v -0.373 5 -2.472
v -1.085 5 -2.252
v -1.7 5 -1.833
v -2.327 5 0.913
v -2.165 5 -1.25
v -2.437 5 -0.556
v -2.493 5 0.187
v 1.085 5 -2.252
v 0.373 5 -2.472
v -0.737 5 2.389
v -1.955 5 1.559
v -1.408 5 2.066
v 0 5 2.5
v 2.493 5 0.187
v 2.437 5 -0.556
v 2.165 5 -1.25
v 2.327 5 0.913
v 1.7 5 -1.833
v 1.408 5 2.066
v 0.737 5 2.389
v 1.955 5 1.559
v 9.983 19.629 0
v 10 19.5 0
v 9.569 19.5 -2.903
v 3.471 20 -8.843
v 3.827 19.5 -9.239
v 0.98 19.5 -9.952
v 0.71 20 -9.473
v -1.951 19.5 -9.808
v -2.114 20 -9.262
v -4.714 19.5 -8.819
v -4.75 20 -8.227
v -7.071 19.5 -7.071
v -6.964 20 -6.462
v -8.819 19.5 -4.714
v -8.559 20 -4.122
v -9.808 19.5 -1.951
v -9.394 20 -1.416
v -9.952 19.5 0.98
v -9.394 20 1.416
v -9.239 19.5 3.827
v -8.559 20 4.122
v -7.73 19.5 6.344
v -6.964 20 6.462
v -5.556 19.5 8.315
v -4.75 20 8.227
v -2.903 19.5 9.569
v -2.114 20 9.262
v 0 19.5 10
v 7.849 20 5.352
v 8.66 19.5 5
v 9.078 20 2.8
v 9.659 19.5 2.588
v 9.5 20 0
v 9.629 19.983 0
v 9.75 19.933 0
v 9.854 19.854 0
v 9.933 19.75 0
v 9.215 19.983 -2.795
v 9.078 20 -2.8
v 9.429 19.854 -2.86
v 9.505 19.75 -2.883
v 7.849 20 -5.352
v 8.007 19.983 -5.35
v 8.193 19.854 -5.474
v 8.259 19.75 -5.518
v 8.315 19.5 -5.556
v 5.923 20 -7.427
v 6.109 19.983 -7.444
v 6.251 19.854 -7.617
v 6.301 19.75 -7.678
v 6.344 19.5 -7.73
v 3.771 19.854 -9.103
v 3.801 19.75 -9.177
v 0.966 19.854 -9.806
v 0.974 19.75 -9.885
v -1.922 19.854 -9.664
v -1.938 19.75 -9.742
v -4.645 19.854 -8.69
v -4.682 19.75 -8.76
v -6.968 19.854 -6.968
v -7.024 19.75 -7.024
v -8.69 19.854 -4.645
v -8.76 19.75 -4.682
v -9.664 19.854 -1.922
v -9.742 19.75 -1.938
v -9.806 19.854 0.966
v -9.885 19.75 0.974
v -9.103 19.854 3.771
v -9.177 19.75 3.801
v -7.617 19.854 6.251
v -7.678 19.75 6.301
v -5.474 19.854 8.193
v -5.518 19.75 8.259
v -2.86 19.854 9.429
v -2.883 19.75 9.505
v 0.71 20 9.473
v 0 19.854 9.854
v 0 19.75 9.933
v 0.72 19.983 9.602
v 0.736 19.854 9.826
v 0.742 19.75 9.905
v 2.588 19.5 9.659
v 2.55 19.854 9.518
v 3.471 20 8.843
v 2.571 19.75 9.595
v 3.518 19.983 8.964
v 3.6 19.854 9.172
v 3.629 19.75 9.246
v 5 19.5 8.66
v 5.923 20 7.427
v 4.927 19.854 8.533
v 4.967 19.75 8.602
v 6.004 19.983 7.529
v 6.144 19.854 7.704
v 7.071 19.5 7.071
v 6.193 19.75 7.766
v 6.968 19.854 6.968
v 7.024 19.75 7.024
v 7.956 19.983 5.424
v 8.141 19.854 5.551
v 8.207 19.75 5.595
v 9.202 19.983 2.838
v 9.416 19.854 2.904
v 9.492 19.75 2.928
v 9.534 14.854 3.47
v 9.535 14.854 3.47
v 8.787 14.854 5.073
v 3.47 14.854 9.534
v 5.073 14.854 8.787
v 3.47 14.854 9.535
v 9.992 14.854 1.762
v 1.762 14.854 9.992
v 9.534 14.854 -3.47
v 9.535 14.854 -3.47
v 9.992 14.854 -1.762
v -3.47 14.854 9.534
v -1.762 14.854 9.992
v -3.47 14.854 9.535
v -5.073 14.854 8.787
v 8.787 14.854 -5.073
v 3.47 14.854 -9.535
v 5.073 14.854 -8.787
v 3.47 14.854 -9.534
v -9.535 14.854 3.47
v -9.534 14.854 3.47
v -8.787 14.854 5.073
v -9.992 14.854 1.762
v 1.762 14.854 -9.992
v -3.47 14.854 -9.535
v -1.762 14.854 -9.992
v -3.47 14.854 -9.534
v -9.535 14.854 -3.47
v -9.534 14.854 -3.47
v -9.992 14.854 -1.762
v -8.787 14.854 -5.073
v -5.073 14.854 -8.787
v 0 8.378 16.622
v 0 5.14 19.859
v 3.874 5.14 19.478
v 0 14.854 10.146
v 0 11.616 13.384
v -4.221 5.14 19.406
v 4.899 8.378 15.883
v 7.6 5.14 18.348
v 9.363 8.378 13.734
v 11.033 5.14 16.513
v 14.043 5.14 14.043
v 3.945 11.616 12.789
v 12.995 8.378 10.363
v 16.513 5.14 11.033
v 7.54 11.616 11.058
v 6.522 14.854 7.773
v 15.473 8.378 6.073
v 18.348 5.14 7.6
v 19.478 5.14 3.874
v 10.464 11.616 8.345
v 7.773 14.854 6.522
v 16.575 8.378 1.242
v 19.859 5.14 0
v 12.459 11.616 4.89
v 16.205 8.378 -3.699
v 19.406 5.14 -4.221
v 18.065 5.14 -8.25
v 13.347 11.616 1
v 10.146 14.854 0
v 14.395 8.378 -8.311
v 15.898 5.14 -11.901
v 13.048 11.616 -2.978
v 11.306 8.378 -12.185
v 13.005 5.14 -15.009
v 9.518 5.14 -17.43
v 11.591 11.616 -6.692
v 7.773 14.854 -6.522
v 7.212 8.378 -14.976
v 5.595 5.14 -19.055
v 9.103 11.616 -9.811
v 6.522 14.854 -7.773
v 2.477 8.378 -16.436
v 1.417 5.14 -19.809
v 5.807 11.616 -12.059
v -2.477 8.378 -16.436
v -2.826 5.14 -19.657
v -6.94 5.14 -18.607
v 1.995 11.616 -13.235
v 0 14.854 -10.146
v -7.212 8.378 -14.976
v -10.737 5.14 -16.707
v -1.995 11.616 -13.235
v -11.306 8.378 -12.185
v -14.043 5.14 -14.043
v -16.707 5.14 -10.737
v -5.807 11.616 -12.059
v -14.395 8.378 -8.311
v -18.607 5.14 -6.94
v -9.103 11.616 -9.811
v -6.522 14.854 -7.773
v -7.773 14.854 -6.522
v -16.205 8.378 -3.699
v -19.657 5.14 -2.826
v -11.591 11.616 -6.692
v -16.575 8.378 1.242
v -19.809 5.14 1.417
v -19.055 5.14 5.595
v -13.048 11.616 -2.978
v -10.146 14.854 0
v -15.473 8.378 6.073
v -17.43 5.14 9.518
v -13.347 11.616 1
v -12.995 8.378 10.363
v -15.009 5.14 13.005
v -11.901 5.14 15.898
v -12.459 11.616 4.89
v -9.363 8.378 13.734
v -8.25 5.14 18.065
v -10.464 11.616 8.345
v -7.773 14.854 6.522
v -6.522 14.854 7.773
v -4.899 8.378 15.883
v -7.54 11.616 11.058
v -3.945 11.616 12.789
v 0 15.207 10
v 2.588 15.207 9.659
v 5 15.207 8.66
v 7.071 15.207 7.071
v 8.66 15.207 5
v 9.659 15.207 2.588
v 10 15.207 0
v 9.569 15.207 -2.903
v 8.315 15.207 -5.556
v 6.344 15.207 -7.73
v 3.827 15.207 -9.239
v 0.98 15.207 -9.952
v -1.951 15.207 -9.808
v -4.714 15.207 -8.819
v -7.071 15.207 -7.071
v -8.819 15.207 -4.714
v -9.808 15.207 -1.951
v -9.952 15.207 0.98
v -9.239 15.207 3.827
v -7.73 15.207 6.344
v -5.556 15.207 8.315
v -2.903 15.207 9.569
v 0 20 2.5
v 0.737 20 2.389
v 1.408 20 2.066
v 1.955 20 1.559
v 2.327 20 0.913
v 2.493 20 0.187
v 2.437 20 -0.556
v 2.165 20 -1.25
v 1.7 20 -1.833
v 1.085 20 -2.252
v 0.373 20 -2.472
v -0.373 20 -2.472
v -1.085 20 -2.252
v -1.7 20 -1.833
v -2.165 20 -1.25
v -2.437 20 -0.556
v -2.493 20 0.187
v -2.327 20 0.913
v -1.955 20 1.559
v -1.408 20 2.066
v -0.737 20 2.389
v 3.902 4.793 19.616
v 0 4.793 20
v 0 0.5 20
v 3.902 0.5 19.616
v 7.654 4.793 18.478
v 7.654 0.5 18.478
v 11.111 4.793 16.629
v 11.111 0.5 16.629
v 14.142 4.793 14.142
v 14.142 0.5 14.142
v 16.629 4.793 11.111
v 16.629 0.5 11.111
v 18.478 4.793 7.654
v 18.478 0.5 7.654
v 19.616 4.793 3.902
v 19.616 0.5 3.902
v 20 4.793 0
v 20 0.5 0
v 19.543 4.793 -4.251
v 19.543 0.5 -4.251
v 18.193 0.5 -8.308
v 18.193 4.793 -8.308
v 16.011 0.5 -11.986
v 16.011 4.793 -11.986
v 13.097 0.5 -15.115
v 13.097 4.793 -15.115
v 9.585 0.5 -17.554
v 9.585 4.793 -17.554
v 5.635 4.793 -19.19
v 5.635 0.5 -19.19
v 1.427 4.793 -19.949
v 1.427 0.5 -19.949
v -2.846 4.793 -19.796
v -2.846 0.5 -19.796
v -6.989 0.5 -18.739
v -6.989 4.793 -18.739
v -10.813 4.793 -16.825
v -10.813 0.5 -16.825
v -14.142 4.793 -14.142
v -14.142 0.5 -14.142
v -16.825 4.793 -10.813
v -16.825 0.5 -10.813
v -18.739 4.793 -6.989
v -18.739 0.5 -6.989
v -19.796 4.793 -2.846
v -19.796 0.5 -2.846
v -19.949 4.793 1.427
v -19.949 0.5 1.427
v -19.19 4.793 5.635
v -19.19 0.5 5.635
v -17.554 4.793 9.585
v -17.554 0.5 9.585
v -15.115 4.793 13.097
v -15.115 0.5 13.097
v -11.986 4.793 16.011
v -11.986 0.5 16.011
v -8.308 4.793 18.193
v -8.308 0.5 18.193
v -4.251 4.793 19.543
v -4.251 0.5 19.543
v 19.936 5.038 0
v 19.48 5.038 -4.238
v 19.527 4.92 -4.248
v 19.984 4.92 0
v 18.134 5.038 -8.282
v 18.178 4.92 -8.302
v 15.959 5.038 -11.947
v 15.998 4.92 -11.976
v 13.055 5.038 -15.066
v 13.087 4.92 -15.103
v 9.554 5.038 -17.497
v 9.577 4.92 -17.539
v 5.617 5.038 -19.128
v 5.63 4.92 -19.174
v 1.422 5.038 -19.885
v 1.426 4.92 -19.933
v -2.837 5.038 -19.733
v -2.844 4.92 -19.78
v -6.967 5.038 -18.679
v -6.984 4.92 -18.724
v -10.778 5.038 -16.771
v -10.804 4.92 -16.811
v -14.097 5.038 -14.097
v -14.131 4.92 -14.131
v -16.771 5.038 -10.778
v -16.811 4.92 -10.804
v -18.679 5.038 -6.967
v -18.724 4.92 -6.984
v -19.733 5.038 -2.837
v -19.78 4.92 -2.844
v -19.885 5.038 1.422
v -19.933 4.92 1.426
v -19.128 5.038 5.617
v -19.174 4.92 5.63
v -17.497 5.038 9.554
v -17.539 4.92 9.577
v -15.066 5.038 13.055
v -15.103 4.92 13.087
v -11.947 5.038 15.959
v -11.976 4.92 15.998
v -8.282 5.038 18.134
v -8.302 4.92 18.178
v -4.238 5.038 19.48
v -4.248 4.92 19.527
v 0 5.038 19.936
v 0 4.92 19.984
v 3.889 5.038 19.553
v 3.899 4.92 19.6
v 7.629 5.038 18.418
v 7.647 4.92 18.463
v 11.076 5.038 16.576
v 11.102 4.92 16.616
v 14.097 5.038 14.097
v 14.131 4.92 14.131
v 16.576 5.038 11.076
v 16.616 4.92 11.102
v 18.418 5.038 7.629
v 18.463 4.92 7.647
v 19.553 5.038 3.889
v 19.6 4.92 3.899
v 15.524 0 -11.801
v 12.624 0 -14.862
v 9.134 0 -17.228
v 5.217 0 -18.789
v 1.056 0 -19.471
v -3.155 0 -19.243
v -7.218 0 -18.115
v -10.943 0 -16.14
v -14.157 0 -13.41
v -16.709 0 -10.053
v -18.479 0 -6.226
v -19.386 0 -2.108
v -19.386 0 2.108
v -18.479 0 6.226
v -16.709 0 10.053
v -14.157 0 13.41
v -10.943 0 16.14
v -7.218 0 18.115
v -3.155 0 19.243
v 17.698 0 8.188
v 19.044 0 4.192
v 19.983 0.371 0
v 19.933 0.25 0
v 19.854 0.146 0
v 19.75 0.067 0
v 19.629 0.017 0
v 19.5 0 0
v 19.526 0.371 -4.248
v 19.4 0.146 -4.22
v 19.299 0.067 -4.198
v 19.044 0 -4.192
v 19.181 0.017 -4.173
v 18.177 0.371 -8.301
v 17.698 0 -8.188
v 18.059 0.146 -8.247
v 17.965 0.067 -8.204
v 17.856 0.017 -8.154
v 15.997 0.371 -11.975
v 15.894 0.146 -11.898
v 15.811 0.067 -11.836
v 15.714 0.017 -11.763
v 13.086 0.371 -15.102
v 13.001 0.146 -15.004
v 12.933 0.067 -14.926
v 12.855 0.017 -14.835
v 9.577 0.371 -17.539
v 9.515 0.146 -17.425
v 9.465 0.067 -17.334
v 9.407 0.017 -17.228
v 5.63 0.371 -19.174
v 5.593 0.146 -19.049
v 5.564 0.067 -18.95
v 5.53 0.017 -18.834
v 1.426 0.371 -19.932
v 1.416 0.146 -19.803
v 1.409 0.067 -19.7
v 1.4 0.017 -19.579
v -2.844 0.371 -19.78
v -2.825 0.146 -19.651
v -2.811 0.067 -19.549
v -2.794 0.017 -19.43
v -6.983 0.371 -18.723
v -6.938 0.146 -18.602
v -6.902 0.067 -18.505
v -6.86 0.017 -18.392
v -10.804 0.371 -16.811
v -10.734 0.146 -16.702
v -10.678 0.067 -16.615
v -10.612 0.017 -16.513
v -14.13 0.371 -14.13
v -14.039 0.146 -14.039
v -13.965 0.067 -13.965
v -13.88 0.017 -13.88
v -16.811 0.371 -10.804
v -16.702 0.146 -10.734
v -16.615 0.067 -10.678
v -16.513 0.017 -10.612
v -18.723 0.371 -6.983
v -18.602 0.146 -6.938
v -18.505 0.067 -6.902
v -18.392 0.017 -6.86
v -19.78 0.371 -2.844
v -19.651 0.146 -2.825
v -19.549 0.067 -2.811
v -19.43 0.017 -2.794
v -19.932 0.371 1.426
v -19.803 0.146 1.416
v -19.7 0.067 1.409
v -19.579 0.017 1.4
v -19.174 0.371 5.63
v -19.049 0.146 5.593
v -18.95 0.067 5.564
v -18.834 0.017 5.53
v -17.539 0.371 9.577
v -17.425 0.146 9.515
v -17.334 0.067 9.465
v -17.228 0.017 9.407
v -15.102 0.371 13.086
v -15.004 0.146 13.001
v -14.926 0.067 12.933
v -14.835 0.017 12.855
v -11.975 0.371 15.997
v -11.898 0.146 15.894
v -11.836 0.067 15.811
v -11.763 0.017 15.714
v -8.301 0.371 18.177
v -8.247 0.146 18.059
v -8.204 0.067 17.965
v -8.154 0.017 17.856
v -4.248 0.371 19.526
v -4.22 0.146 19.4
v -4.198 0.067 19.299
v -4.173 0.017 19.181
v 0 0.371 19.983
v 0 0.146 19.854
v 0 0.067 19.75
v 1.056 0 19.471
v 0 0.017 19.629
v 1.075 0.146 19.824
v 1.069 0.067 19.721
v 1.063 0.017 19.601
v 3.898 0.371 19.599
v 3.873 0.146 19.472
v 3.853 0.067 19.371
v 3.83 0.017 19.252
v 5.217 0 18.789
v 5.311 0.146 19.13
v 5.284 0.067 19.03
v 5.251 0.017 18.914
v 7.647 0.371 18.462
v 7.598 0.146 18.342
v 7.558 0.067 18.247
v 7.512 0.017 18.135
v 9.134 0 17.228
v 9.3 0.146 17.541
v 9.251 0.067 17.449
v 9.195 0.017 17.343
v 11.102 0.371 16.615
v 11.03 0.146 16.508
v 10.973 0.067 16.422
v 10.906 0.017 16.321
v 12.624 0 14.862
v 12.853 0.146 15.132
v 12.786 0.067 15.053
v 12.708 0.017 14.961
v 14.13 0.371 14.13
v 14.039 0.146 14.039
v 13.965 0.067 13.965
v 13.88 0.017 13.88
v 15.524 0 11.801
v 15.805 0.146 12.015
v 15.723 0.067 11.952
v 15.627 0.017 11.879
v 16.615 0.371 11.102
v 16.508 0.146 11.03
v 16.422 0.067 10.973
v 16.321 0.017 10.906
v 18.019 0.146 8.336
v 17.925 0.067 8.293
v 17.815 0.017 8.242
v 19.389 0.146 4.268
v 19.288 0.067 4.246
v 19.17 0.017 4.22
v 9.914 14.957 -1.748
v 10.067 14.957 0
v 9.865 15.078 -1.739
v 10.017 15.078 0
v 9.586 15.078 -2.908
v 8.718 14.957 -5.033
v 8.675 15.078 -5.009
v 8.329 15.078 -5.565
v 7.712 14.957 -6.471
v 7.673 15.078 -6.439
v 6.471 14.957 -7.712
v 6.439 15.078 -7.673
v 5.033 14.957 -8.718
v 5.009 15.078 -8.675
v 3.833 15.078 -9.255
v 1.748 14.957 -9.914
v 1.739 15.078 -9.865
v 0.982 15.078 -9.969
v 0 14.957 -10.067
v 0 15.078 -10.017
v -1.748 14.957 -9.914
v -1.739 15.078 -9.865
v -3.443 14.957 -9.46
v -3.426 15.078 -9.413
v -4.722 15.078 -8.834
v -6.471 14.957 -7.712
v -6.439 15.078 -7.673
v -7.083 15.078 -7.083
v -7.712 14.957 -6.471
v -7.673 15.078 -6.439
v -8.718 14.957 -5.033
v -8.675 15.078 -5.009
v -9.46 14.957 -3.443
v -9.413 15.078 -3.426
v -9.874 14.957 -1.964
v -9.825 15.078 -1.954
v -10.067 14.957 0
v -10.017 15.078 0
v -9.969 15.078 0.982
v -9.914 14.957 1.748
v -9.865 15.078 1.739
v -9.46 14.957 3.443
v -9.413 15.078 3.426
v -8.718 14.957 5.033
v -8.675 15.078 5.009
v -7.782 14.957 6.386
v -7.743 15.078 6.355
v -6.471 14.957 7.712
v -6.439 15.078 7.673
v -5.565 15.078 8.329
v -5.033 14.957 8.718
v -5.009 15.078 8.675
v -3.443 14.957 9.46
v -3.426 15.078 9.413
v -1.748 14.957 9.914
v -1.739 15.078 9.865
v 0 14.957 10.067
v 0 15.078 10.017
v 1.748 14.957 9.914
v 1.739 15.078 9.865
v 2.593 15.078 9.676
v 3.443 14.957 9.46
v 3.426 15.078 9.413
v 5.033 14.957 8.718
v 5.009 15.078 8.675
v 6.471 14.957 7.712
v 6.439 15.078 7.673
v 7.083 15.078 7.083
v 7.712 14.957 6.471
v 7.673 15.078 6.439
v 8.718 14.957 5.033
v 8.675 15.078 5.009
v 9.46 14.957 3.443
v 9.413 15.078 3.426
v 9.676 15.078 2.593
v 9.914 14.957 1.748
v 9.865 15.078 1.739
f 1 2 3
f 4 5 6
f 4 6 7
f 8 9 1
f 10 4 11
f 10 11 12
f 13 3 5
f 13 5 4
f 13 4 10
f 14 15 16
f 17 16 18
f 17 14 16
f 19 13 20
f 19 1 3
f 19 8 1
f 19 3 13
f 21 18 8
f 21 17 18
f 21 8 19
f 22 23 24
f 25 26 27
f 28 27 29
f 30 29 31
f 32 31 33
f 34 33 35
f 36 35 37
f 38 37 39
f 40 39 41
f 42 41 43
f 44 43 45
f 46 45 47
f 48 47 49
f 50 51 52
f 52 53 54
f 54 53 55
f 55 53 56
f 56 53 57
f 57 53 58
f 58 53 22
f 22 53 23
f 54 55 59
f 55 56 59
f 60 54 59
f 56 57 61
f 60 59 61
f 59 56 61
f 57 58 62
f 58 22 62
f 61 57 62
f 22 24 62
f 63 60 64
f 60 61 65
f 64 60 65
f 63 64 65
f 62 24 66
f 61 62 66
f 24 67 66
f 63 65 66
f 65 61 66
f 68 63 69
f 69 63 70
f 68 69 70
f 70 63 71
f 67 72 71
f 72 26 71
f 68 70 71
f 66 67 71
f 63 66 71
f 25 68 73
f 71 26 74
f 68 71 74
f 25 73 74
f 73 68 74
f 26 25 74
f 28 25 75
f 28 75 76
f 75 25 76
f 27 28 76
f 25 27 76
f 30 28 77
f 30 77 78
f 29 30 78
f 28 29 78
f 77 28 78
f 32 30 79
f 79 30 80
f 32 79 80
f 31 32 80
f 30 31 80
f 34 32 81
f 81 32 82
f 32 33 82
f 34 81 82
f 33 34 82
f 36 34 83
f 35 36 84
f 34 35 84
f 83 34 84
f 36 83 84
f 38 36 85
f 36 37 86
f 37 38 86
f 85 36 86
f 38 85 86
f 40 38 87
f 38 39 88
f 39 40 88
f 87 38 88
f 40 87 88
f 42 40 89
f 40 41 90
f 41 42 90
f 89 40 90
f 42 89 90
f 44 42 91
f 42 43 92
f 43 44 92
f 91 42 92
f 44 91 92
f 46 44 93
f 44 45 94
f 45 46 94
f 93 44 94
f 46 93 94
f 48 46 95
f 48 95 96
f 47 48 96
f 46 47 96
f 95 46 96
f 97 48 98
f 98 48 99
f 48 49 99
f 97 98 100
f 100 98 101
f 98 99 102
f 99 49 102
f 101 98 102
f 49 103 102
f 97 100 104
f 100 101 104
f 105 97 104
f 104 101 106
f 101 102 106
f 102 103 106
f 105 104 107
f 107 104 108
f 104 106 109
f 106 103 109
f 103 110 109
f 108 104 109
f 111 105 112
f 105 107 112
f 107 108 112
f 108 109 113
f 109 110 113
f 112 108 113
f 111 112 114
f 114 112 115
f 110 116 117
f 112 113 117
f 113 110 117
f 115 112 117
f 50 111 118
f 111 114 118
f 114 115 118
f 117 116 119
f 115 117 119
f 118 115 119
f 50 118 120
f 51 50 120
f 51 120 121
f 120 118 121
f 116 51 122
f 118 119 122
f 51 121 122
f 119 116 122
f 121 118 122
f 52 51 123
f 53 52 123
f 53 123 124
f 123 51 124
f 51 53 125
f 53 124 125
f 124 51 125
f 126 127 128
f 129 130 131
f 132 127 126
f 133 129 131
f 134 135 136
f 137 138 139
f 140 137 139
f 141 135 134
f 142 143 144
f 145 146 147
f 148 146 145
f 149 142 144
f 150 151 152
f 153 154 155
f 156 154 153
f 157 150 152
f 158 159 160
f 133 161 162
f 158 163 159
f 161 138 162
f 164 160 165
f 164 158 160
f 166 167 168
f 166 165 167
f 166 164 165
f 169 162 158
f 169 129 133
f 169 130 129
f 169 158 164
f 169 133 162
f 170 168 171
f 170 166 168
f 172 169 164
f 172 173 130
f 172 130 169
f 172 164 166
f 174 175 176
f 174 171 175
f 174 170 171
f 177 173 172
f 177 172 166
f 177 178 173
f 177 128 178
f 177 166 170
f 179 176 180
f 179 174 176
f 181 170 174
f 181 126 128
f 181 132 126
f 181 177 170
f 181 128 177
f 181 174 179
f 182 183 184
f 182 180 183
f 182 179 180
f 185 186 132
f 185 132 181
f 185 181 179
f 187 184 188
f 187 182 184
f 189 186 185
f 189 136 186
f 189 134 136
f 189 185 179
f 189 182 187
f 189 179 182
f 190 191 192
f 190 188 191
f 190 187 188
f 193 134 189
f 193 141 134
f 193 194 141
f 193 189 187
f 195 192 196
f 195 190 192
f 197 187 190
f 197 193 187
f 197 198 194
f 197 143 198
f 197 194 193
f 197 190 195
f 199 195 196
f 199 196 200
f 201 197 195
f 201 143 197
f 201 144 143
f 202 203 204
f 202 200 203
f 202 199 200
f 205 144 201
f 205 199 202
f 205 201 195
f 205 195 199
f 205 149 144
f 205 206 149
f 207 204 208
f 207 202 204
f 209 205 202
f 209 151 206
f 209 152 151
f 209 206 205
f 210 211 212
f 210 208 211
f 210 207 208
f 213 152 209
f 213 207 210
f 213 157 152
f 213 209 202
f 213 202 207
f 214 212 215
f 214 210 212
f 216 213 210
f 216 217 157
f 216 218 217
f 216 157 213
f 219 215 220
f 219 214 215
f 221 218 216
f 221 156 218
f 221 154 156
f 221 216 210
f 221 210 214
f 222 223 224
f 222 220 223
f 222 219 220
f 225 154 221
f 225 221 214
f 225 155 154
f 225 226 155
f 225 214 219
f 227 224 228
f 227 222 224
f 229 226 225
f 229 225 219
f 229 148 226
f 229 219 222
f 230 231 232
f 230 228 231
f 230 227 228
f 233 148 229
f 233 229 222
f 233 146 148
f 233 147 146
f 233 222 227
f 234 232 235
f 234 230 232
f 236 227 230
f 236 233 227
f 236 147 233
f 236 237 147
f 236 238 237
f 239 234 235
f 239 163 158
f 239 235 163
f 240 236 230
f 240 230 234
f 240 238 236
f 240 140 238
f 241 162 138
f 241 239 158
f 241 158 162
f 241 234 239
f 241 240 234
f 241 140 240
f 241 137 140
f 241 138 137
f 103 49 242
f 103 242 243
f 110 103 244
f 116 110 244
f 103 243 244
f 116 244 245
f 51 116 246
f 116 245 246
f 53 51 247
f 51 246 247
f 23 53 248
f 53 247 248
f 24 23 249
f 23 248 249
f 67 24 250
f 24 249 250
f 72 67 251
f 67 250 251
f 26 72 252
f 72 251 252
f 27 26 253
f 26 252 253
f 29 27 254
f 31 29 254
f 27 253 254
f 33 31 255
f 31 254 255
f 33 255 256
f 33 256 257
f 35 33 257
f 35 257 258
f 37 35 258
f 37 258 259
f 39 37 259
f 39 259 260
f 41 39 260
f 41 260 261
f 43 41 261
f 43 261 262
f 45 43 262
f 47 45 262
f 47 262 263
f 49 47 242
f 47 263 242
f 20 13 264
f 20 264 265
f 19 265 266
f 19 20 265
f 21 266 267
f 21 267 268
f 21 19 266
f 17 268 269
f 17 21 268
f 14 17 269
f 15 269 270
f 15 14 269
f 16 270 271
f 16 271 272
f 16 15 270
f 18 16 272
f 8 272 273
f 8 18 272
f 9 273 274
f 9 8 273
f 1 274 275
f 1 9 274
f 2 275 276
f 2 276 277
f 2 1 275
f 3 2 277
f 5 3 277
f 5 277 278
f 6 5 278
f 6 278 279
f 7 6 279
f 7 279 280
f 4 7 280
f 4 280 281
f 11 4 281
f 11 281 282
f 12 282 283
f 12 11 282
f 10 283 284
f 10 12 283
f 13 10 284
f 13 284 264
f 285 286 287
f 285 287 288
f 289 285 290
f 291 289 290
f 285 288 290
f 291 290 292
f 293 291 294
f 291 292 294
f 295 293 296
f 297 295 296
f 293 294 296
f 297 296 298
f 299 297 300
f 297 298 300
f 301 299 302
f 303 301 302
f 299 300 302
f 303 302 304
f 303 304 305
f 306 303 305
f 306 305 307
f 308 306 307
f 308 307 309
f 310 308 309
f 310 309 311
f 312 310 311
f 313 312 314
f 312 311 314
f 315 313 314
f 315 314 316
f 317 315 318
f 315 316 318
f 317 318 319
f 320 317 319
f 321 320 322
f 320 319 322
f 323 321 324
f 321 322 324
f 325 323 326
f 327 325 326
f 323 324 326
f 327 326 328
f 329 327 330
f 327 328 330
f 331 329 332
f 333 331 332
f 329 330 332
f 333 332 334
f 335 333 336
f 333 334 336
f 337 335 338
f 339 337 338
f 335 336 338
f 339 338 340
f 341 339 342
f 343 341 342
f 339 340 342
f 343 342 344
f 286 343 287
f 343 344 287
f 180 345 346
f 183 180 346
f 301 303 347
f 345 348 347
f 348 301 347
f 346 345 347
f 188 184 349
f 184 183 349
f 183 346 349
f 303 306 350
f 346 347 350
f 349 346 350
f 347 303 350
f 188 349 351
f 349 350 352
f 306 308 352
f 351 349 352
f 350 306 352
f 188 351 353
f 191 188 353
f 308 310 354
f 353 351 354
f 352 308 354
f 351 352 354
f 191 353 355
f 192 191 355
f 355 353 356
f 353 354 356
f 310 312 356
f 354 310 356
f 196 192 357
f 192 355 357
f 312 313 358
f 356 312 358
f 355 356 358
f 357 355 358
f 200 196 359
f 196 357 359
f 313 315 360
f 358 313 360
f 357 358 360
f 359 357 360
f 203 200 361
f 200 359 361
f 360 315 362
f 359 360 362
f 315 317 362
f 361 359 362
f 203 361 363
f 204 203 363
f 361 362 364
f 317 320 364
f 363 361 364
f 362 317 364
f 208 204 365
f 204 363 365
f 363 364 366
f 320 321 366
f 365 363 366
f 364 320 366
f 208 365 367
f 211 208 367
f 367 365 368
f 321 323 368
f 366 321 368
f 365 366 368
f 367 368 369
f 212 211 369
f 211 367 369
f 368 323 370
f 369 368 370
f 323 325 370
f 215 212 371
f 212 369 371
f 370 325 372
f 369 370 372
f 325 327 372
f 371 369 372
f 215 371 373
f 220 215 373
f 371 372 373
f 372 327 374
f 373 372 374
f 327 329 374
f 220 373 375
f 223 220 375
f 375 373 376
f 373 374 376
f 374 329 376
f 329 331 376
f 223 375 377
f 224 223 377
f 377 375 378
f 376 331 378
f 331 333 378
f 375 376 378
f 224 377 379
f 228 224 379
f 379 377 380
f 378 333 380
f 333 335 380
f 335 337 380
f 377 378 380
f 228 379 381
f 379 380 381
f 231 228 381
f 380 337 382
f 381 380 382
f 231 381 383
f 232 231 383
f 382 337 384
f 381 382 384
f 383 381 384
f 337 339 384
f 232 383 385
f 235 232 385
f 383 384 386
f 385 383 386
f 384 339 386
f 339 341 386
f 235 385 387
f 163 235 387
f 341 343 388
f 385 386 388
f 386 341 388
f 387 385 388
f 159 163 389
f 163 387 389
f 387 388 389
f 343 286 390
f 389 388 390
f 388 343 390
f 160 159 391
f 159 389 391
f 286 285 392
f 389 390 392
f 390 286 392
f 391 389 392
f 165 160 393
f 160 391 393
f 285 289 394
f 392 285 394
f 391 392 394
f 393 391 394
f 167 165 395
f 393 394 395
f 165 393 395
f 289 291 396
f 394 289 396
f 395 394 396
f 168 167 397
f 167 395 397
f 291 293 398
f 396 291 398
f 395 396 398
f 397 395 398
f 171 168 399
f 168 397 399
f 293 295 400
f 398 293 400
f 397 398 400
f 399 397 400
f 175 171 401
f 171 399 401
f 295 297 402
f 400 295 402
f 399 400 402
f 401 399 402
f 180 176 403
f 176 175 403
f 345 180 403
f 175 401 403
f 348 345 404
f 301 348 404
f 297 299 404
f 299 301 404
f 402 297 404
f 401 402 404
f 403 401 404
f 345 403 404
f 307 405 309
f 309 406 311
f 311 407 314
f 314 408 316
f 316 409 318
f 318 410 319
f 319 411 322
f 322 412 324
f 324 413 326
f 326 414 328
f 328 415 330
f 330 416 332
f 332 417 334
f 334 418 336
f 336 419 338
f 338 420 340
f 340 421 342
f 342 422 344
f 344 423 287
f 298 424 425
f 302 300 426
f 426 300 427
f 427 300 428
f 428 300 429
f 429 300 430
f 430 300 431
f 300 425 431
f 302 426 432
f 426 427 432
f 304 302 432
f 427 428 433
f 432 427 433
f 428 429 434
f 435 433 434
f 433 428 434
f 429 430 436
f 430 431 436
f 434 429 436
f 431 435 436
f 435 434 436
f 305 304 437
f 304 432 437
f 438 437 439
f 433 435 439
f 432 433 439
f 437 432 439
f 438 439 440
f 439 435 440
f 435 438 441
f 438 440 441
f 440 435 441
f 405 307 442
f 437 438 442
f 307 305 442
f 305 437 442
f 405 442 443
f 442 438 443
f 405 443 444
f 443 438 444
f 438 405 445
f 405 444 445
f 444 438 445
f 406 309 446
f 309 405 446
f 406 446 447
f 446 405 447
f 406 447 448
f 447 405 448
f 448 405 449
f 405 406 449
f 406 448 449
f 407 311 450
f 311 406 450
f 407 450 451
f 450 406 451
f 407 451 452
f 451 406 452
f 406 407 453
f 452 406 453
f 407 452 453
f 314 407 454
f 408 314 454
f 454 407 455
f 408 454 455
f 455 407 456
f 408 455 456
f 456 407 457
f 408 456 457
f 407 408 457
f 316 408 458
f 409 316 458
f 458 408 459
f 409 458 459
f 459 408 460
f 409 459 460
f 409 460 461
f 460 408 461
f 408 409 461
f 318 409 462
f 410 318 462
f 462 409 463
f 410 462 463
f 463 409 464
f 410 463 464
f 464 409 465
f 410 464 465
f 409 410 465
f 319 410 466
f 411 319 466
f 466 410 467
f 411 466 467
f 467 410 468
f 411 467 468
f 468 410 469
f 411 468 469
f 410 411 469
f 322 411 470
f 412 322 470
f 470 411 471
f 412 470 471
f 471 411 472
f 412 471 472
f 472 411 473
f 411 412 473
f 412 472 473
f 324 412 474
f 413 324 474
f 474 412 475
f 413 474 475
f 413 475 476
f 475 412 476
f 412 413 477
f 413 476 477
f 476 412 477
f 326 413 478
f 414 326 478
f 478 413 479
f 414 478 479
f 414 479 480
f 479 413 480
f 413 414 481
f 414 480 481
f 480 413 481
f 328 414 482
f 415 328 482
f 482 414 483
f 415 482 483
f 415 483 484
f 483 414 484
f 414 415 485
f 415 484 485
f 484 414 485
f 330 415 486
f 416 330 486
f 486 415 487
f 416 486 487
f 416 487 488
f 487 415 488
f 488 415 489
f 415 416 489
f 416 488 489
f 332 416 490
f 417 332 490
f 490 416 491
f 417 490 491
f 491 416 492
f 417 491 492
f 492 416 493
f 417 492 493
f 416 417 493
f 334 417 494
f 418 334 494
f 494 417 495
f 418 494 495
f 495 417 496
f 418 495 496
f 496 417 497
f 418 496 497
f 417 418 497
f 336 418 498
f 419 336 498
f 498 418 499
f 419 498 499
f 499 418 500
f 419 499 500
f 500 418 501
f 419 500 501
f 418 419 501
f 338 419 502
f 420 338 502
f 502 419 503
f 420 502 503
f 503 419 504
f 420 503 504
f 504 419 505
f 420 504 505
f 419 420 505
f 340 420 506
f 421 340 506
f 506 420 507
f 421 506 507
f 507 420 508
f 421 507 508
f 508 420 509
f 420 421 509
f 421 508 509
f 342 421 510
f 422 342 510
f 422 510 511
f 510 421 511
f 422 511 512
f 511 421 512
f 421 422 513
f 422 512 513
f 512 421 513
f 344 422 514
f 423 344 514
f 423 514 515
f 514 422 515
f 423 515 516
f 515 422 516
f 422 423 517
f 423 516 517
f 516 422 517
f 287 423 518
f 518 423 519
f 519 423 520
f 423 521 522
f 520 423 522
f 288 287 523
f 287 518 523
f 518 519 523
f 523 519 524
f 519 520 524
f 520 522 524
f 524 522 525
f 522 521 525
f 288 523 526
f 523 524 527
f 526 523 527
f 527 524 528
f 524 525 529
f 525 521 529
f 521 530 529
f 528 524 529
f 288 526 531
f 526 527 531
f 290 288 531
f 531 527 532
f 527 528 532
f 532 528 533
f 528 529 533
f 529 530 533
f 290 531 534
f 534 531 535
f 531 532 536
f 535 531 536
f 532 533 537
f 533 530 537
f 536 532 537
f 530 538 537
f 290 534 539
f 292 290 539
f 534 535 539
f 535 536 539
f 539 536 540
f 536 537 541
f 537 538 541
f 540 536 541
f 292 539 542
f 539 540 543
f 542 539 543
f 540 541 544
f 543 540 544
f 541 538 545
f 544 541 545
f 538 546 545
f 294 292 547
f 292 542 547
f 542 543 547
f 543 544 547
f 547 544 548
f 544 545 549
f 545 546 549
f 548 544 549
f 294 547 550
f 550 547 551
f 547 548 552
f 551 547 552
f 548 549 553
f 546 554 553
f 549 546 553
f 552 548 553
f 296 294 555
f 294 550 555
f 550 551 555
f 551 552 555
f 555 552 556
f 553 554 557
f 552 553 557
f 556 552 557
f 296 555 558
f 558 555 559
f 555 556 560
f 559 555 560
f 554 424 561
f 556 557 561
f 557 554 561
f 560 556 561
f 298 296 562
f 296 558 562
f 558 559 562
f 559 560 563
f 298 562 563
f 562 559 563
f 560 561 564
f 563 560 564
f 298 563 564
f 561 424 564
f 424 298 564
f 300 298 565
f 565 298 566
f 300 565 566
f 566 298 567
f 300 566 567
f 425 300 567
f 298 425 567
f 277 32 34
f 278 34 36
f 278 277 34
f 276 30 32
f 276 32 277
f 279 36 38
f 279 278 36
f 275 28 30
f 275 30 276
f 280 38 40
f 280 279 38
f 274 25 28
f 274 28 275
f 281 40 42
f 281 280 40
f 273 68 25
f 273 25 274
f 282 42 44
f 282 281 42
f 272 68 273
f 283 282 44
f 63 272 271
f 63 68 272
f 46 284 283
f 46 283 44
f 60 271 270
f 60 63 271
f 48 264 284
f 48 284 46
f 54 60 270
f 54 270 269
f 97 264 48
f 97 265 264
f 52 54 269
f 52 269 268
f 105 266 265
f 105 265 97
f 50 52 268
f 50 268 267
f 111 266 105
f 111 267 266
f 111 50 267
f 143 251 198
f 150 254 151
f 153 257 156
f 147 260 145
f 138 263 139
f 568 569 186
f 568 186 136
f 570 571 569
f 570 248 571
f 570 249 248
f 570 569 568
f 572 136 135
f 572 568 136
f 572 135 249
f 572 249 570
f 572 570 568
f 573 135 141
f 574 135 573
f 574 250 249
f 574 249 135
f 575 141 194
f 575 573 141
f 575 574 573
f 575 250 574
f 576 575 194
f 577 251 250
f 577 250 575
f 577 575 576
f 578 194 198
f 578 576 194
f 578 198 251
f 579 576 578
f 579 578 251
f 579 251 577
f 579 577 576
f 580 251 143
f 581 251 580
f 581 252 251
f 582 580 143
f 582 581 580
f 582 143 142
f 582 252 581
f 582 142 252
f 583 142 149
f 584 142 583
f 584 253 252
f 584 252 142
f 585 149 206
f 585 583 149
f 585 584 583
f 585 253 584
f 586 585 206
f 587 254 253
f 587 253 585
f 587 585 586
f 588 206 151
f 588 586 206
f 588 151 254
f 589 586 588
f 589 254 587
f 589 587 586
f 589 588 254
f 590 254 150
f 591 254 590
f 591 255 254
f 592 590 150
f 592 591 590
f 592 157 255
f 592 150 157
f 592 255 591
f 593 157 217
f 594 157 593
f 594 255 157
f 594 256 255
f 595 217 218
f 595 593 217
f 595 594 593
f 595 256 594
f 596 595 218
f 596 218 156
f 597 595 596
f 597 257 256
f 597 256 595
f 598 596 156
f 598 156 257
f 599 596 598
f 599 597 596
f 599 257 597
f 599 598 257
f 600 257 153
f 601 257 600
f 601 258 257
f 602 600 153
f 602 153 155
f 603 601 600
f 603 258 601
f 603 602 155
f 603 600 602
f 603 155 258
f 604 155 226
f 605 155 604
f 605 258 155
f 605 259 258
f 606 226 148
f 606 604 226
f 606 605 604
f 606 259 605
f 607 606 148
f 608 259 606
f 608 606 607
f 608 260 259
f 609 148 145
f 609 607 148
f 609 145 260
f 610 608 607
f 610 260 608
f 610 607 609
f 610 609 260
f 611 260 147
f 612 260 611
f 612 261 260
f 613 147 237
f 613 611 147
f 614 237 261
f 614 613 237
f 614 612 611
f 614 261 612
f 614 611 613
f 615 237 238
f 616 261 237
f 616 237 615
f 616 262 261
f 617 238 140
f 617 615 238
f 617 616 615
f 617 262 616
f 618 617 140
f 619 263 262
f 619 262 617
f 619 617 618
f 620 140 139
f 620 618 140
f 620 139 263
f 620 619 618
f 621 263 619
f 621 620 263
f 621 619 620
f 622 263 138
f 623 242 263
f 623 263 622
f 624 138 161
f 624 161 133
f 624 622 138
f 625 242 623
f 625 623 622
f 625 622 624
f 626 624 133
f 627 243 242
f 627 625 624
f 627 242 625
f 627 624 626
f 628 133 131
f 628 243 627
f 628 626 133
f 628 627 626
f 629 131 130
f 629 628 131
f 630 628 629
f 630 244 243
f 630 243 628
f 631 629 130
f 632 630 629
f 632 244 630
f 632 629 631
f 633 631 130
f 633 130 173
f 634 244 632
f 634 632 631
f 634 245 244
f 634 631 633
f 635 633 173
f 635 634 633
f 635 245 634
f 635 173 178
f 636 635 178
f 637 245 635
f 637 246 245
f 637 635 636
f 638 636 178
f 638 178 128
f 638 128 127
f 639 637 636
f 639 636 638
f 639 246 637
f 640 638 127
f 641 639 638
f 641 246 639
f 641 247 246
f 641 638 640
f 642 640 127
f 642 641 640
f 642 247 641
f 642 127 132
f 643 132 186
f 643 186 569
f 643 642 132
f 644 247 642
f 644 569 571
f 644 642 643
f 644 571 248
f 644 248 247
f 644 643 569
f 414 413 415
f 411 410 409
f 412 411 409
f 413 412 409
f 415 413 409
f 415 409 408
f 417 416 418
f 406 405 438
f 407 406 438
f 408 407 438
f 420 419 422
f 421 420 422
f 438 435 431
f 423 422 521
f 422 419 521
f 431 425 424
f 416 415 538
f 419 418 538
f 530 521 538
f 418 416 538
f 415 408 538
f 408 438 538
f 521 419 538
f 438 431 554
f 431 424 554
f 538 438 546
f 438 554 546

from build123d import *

# Parameters (mm, degrees)
SKETCH1_R           = 20
BOSS_EXTRUDE1_DEPTH = 20
CUT_EXTRUDE1_START  = -15
SKETCH2_R           = 20
SKETCH2_R_2         = 10
SKETCH2_R_3         = 2.5
CUT_EXTRUDE1_DEPTH  = 15
CHAMFER1_SIZE       = 10


with BuildPart() as part:
    # Sketch1 → Boss-Extrude1 (new body)
    with BuildSketch(Plane(origin=(0, 0, 0), x_dir=(1, 0, 0), z_dir=(0, 1, 0))):
        with Locations(Location((0, 0, 0), (0, 0, 270))):
            Circle(SKETCH1_R)
    extrude(amount=BOSS_EXTRUDE1_DEPTH)

    # Sketch2 → Cut-Extrude1 (cut)
    # profile 1 of 2: a face of its own
    with BuildSketch(Plane(origin=(0, 20, 0), x_dir=(1, 0, 0), z_dir=(0, 1, 0)).offset(CUT_EXTRUDE1_START)):
        with Locations(Location((0, 0, 0), (0, 0, 270))):
            Circle(SKETCH2_R)
        with Locations(Location((0, 0, 0), (0, 0, 270))):
            Circle(SKETCH2_R_2, mode=Mode.SUBTRACT)
    # profile 2 of 2: a face of its own
    with BuildSketch(Plane(origin=(0, 20, 0), x_dir=(1, 0, 0), z_dir=(0, 1, 0)).offset(CUT_EXTRUDE1_START)):
        with Locations(Location((0, 0, 0), (0, 0, 270))):
            Circle(SKETCH2_R_3)
    extrude(amount=CUT_EXTRUDE1_DEPTH, mode=Mode.SUBTRACT)

    # Chamfer1
    chamfer1_edges = [part.edges().sort_by_distance(p)[0] for p in [
        (0, 5, -10),
    ]]
    chamfer(chamfer1_edges, length=CHAMFER1_SIZE - 0.0001)  # a hair under: the kernel refuses the full size

    # Fillet2: read off the stored shape, not the designer's step
    # Fillet2 outline → Fillet2 (revolve, cut)
    with BuildSketch(Plane.XY):
        with BuildLine():
            Line((20, 5.146446609), (19.853553391, 5.146446609))
            ThreePointArc((19.853553391, 5.146446609), (19.961939766, 4.984234935), (20, 4.792893219))
            Line((20, 4.792893219), (20, 5.146446609))
        make_face()
        with BuildLine():
            Line((20, 0), (20, 0.5))
            ThreePointArc((20, 0.5), (19.853553391, 0.146446609), (19.5, 0))
            Line((19.5, 0), (20, 0))
        make_face()
        with BuildLine():
            ThreePointArc((9.5, 20), (9.853553391, 19.853553391), (10, 19.5))
            Line((10, 19.5), (10, 20))
            Line((10, 20), (9.5, 20))
        make_face()
    revolve(axis=Axis((0, 0, 0), (0, 1, 0)), mode=Mode.SUBTRACT)

    # Fillet2 2 outline → Fillet2 2 (revolve)
    with BuildSketch(Plane.XY):
        with BuildLine():
            Line((10, 14.853553391), (10.146446609, 14.853553391))
            ThreePointArc((10.146446609, 14.853553391), (10.038060234, 15.015765065), (10, 15.207106781))
            Line((10, 15.207106781), (10, 14.853553391))
        make_face()
    revolve(axis=Axis((0, 0, 0), (0, 1, 0)))


solid = part.part
